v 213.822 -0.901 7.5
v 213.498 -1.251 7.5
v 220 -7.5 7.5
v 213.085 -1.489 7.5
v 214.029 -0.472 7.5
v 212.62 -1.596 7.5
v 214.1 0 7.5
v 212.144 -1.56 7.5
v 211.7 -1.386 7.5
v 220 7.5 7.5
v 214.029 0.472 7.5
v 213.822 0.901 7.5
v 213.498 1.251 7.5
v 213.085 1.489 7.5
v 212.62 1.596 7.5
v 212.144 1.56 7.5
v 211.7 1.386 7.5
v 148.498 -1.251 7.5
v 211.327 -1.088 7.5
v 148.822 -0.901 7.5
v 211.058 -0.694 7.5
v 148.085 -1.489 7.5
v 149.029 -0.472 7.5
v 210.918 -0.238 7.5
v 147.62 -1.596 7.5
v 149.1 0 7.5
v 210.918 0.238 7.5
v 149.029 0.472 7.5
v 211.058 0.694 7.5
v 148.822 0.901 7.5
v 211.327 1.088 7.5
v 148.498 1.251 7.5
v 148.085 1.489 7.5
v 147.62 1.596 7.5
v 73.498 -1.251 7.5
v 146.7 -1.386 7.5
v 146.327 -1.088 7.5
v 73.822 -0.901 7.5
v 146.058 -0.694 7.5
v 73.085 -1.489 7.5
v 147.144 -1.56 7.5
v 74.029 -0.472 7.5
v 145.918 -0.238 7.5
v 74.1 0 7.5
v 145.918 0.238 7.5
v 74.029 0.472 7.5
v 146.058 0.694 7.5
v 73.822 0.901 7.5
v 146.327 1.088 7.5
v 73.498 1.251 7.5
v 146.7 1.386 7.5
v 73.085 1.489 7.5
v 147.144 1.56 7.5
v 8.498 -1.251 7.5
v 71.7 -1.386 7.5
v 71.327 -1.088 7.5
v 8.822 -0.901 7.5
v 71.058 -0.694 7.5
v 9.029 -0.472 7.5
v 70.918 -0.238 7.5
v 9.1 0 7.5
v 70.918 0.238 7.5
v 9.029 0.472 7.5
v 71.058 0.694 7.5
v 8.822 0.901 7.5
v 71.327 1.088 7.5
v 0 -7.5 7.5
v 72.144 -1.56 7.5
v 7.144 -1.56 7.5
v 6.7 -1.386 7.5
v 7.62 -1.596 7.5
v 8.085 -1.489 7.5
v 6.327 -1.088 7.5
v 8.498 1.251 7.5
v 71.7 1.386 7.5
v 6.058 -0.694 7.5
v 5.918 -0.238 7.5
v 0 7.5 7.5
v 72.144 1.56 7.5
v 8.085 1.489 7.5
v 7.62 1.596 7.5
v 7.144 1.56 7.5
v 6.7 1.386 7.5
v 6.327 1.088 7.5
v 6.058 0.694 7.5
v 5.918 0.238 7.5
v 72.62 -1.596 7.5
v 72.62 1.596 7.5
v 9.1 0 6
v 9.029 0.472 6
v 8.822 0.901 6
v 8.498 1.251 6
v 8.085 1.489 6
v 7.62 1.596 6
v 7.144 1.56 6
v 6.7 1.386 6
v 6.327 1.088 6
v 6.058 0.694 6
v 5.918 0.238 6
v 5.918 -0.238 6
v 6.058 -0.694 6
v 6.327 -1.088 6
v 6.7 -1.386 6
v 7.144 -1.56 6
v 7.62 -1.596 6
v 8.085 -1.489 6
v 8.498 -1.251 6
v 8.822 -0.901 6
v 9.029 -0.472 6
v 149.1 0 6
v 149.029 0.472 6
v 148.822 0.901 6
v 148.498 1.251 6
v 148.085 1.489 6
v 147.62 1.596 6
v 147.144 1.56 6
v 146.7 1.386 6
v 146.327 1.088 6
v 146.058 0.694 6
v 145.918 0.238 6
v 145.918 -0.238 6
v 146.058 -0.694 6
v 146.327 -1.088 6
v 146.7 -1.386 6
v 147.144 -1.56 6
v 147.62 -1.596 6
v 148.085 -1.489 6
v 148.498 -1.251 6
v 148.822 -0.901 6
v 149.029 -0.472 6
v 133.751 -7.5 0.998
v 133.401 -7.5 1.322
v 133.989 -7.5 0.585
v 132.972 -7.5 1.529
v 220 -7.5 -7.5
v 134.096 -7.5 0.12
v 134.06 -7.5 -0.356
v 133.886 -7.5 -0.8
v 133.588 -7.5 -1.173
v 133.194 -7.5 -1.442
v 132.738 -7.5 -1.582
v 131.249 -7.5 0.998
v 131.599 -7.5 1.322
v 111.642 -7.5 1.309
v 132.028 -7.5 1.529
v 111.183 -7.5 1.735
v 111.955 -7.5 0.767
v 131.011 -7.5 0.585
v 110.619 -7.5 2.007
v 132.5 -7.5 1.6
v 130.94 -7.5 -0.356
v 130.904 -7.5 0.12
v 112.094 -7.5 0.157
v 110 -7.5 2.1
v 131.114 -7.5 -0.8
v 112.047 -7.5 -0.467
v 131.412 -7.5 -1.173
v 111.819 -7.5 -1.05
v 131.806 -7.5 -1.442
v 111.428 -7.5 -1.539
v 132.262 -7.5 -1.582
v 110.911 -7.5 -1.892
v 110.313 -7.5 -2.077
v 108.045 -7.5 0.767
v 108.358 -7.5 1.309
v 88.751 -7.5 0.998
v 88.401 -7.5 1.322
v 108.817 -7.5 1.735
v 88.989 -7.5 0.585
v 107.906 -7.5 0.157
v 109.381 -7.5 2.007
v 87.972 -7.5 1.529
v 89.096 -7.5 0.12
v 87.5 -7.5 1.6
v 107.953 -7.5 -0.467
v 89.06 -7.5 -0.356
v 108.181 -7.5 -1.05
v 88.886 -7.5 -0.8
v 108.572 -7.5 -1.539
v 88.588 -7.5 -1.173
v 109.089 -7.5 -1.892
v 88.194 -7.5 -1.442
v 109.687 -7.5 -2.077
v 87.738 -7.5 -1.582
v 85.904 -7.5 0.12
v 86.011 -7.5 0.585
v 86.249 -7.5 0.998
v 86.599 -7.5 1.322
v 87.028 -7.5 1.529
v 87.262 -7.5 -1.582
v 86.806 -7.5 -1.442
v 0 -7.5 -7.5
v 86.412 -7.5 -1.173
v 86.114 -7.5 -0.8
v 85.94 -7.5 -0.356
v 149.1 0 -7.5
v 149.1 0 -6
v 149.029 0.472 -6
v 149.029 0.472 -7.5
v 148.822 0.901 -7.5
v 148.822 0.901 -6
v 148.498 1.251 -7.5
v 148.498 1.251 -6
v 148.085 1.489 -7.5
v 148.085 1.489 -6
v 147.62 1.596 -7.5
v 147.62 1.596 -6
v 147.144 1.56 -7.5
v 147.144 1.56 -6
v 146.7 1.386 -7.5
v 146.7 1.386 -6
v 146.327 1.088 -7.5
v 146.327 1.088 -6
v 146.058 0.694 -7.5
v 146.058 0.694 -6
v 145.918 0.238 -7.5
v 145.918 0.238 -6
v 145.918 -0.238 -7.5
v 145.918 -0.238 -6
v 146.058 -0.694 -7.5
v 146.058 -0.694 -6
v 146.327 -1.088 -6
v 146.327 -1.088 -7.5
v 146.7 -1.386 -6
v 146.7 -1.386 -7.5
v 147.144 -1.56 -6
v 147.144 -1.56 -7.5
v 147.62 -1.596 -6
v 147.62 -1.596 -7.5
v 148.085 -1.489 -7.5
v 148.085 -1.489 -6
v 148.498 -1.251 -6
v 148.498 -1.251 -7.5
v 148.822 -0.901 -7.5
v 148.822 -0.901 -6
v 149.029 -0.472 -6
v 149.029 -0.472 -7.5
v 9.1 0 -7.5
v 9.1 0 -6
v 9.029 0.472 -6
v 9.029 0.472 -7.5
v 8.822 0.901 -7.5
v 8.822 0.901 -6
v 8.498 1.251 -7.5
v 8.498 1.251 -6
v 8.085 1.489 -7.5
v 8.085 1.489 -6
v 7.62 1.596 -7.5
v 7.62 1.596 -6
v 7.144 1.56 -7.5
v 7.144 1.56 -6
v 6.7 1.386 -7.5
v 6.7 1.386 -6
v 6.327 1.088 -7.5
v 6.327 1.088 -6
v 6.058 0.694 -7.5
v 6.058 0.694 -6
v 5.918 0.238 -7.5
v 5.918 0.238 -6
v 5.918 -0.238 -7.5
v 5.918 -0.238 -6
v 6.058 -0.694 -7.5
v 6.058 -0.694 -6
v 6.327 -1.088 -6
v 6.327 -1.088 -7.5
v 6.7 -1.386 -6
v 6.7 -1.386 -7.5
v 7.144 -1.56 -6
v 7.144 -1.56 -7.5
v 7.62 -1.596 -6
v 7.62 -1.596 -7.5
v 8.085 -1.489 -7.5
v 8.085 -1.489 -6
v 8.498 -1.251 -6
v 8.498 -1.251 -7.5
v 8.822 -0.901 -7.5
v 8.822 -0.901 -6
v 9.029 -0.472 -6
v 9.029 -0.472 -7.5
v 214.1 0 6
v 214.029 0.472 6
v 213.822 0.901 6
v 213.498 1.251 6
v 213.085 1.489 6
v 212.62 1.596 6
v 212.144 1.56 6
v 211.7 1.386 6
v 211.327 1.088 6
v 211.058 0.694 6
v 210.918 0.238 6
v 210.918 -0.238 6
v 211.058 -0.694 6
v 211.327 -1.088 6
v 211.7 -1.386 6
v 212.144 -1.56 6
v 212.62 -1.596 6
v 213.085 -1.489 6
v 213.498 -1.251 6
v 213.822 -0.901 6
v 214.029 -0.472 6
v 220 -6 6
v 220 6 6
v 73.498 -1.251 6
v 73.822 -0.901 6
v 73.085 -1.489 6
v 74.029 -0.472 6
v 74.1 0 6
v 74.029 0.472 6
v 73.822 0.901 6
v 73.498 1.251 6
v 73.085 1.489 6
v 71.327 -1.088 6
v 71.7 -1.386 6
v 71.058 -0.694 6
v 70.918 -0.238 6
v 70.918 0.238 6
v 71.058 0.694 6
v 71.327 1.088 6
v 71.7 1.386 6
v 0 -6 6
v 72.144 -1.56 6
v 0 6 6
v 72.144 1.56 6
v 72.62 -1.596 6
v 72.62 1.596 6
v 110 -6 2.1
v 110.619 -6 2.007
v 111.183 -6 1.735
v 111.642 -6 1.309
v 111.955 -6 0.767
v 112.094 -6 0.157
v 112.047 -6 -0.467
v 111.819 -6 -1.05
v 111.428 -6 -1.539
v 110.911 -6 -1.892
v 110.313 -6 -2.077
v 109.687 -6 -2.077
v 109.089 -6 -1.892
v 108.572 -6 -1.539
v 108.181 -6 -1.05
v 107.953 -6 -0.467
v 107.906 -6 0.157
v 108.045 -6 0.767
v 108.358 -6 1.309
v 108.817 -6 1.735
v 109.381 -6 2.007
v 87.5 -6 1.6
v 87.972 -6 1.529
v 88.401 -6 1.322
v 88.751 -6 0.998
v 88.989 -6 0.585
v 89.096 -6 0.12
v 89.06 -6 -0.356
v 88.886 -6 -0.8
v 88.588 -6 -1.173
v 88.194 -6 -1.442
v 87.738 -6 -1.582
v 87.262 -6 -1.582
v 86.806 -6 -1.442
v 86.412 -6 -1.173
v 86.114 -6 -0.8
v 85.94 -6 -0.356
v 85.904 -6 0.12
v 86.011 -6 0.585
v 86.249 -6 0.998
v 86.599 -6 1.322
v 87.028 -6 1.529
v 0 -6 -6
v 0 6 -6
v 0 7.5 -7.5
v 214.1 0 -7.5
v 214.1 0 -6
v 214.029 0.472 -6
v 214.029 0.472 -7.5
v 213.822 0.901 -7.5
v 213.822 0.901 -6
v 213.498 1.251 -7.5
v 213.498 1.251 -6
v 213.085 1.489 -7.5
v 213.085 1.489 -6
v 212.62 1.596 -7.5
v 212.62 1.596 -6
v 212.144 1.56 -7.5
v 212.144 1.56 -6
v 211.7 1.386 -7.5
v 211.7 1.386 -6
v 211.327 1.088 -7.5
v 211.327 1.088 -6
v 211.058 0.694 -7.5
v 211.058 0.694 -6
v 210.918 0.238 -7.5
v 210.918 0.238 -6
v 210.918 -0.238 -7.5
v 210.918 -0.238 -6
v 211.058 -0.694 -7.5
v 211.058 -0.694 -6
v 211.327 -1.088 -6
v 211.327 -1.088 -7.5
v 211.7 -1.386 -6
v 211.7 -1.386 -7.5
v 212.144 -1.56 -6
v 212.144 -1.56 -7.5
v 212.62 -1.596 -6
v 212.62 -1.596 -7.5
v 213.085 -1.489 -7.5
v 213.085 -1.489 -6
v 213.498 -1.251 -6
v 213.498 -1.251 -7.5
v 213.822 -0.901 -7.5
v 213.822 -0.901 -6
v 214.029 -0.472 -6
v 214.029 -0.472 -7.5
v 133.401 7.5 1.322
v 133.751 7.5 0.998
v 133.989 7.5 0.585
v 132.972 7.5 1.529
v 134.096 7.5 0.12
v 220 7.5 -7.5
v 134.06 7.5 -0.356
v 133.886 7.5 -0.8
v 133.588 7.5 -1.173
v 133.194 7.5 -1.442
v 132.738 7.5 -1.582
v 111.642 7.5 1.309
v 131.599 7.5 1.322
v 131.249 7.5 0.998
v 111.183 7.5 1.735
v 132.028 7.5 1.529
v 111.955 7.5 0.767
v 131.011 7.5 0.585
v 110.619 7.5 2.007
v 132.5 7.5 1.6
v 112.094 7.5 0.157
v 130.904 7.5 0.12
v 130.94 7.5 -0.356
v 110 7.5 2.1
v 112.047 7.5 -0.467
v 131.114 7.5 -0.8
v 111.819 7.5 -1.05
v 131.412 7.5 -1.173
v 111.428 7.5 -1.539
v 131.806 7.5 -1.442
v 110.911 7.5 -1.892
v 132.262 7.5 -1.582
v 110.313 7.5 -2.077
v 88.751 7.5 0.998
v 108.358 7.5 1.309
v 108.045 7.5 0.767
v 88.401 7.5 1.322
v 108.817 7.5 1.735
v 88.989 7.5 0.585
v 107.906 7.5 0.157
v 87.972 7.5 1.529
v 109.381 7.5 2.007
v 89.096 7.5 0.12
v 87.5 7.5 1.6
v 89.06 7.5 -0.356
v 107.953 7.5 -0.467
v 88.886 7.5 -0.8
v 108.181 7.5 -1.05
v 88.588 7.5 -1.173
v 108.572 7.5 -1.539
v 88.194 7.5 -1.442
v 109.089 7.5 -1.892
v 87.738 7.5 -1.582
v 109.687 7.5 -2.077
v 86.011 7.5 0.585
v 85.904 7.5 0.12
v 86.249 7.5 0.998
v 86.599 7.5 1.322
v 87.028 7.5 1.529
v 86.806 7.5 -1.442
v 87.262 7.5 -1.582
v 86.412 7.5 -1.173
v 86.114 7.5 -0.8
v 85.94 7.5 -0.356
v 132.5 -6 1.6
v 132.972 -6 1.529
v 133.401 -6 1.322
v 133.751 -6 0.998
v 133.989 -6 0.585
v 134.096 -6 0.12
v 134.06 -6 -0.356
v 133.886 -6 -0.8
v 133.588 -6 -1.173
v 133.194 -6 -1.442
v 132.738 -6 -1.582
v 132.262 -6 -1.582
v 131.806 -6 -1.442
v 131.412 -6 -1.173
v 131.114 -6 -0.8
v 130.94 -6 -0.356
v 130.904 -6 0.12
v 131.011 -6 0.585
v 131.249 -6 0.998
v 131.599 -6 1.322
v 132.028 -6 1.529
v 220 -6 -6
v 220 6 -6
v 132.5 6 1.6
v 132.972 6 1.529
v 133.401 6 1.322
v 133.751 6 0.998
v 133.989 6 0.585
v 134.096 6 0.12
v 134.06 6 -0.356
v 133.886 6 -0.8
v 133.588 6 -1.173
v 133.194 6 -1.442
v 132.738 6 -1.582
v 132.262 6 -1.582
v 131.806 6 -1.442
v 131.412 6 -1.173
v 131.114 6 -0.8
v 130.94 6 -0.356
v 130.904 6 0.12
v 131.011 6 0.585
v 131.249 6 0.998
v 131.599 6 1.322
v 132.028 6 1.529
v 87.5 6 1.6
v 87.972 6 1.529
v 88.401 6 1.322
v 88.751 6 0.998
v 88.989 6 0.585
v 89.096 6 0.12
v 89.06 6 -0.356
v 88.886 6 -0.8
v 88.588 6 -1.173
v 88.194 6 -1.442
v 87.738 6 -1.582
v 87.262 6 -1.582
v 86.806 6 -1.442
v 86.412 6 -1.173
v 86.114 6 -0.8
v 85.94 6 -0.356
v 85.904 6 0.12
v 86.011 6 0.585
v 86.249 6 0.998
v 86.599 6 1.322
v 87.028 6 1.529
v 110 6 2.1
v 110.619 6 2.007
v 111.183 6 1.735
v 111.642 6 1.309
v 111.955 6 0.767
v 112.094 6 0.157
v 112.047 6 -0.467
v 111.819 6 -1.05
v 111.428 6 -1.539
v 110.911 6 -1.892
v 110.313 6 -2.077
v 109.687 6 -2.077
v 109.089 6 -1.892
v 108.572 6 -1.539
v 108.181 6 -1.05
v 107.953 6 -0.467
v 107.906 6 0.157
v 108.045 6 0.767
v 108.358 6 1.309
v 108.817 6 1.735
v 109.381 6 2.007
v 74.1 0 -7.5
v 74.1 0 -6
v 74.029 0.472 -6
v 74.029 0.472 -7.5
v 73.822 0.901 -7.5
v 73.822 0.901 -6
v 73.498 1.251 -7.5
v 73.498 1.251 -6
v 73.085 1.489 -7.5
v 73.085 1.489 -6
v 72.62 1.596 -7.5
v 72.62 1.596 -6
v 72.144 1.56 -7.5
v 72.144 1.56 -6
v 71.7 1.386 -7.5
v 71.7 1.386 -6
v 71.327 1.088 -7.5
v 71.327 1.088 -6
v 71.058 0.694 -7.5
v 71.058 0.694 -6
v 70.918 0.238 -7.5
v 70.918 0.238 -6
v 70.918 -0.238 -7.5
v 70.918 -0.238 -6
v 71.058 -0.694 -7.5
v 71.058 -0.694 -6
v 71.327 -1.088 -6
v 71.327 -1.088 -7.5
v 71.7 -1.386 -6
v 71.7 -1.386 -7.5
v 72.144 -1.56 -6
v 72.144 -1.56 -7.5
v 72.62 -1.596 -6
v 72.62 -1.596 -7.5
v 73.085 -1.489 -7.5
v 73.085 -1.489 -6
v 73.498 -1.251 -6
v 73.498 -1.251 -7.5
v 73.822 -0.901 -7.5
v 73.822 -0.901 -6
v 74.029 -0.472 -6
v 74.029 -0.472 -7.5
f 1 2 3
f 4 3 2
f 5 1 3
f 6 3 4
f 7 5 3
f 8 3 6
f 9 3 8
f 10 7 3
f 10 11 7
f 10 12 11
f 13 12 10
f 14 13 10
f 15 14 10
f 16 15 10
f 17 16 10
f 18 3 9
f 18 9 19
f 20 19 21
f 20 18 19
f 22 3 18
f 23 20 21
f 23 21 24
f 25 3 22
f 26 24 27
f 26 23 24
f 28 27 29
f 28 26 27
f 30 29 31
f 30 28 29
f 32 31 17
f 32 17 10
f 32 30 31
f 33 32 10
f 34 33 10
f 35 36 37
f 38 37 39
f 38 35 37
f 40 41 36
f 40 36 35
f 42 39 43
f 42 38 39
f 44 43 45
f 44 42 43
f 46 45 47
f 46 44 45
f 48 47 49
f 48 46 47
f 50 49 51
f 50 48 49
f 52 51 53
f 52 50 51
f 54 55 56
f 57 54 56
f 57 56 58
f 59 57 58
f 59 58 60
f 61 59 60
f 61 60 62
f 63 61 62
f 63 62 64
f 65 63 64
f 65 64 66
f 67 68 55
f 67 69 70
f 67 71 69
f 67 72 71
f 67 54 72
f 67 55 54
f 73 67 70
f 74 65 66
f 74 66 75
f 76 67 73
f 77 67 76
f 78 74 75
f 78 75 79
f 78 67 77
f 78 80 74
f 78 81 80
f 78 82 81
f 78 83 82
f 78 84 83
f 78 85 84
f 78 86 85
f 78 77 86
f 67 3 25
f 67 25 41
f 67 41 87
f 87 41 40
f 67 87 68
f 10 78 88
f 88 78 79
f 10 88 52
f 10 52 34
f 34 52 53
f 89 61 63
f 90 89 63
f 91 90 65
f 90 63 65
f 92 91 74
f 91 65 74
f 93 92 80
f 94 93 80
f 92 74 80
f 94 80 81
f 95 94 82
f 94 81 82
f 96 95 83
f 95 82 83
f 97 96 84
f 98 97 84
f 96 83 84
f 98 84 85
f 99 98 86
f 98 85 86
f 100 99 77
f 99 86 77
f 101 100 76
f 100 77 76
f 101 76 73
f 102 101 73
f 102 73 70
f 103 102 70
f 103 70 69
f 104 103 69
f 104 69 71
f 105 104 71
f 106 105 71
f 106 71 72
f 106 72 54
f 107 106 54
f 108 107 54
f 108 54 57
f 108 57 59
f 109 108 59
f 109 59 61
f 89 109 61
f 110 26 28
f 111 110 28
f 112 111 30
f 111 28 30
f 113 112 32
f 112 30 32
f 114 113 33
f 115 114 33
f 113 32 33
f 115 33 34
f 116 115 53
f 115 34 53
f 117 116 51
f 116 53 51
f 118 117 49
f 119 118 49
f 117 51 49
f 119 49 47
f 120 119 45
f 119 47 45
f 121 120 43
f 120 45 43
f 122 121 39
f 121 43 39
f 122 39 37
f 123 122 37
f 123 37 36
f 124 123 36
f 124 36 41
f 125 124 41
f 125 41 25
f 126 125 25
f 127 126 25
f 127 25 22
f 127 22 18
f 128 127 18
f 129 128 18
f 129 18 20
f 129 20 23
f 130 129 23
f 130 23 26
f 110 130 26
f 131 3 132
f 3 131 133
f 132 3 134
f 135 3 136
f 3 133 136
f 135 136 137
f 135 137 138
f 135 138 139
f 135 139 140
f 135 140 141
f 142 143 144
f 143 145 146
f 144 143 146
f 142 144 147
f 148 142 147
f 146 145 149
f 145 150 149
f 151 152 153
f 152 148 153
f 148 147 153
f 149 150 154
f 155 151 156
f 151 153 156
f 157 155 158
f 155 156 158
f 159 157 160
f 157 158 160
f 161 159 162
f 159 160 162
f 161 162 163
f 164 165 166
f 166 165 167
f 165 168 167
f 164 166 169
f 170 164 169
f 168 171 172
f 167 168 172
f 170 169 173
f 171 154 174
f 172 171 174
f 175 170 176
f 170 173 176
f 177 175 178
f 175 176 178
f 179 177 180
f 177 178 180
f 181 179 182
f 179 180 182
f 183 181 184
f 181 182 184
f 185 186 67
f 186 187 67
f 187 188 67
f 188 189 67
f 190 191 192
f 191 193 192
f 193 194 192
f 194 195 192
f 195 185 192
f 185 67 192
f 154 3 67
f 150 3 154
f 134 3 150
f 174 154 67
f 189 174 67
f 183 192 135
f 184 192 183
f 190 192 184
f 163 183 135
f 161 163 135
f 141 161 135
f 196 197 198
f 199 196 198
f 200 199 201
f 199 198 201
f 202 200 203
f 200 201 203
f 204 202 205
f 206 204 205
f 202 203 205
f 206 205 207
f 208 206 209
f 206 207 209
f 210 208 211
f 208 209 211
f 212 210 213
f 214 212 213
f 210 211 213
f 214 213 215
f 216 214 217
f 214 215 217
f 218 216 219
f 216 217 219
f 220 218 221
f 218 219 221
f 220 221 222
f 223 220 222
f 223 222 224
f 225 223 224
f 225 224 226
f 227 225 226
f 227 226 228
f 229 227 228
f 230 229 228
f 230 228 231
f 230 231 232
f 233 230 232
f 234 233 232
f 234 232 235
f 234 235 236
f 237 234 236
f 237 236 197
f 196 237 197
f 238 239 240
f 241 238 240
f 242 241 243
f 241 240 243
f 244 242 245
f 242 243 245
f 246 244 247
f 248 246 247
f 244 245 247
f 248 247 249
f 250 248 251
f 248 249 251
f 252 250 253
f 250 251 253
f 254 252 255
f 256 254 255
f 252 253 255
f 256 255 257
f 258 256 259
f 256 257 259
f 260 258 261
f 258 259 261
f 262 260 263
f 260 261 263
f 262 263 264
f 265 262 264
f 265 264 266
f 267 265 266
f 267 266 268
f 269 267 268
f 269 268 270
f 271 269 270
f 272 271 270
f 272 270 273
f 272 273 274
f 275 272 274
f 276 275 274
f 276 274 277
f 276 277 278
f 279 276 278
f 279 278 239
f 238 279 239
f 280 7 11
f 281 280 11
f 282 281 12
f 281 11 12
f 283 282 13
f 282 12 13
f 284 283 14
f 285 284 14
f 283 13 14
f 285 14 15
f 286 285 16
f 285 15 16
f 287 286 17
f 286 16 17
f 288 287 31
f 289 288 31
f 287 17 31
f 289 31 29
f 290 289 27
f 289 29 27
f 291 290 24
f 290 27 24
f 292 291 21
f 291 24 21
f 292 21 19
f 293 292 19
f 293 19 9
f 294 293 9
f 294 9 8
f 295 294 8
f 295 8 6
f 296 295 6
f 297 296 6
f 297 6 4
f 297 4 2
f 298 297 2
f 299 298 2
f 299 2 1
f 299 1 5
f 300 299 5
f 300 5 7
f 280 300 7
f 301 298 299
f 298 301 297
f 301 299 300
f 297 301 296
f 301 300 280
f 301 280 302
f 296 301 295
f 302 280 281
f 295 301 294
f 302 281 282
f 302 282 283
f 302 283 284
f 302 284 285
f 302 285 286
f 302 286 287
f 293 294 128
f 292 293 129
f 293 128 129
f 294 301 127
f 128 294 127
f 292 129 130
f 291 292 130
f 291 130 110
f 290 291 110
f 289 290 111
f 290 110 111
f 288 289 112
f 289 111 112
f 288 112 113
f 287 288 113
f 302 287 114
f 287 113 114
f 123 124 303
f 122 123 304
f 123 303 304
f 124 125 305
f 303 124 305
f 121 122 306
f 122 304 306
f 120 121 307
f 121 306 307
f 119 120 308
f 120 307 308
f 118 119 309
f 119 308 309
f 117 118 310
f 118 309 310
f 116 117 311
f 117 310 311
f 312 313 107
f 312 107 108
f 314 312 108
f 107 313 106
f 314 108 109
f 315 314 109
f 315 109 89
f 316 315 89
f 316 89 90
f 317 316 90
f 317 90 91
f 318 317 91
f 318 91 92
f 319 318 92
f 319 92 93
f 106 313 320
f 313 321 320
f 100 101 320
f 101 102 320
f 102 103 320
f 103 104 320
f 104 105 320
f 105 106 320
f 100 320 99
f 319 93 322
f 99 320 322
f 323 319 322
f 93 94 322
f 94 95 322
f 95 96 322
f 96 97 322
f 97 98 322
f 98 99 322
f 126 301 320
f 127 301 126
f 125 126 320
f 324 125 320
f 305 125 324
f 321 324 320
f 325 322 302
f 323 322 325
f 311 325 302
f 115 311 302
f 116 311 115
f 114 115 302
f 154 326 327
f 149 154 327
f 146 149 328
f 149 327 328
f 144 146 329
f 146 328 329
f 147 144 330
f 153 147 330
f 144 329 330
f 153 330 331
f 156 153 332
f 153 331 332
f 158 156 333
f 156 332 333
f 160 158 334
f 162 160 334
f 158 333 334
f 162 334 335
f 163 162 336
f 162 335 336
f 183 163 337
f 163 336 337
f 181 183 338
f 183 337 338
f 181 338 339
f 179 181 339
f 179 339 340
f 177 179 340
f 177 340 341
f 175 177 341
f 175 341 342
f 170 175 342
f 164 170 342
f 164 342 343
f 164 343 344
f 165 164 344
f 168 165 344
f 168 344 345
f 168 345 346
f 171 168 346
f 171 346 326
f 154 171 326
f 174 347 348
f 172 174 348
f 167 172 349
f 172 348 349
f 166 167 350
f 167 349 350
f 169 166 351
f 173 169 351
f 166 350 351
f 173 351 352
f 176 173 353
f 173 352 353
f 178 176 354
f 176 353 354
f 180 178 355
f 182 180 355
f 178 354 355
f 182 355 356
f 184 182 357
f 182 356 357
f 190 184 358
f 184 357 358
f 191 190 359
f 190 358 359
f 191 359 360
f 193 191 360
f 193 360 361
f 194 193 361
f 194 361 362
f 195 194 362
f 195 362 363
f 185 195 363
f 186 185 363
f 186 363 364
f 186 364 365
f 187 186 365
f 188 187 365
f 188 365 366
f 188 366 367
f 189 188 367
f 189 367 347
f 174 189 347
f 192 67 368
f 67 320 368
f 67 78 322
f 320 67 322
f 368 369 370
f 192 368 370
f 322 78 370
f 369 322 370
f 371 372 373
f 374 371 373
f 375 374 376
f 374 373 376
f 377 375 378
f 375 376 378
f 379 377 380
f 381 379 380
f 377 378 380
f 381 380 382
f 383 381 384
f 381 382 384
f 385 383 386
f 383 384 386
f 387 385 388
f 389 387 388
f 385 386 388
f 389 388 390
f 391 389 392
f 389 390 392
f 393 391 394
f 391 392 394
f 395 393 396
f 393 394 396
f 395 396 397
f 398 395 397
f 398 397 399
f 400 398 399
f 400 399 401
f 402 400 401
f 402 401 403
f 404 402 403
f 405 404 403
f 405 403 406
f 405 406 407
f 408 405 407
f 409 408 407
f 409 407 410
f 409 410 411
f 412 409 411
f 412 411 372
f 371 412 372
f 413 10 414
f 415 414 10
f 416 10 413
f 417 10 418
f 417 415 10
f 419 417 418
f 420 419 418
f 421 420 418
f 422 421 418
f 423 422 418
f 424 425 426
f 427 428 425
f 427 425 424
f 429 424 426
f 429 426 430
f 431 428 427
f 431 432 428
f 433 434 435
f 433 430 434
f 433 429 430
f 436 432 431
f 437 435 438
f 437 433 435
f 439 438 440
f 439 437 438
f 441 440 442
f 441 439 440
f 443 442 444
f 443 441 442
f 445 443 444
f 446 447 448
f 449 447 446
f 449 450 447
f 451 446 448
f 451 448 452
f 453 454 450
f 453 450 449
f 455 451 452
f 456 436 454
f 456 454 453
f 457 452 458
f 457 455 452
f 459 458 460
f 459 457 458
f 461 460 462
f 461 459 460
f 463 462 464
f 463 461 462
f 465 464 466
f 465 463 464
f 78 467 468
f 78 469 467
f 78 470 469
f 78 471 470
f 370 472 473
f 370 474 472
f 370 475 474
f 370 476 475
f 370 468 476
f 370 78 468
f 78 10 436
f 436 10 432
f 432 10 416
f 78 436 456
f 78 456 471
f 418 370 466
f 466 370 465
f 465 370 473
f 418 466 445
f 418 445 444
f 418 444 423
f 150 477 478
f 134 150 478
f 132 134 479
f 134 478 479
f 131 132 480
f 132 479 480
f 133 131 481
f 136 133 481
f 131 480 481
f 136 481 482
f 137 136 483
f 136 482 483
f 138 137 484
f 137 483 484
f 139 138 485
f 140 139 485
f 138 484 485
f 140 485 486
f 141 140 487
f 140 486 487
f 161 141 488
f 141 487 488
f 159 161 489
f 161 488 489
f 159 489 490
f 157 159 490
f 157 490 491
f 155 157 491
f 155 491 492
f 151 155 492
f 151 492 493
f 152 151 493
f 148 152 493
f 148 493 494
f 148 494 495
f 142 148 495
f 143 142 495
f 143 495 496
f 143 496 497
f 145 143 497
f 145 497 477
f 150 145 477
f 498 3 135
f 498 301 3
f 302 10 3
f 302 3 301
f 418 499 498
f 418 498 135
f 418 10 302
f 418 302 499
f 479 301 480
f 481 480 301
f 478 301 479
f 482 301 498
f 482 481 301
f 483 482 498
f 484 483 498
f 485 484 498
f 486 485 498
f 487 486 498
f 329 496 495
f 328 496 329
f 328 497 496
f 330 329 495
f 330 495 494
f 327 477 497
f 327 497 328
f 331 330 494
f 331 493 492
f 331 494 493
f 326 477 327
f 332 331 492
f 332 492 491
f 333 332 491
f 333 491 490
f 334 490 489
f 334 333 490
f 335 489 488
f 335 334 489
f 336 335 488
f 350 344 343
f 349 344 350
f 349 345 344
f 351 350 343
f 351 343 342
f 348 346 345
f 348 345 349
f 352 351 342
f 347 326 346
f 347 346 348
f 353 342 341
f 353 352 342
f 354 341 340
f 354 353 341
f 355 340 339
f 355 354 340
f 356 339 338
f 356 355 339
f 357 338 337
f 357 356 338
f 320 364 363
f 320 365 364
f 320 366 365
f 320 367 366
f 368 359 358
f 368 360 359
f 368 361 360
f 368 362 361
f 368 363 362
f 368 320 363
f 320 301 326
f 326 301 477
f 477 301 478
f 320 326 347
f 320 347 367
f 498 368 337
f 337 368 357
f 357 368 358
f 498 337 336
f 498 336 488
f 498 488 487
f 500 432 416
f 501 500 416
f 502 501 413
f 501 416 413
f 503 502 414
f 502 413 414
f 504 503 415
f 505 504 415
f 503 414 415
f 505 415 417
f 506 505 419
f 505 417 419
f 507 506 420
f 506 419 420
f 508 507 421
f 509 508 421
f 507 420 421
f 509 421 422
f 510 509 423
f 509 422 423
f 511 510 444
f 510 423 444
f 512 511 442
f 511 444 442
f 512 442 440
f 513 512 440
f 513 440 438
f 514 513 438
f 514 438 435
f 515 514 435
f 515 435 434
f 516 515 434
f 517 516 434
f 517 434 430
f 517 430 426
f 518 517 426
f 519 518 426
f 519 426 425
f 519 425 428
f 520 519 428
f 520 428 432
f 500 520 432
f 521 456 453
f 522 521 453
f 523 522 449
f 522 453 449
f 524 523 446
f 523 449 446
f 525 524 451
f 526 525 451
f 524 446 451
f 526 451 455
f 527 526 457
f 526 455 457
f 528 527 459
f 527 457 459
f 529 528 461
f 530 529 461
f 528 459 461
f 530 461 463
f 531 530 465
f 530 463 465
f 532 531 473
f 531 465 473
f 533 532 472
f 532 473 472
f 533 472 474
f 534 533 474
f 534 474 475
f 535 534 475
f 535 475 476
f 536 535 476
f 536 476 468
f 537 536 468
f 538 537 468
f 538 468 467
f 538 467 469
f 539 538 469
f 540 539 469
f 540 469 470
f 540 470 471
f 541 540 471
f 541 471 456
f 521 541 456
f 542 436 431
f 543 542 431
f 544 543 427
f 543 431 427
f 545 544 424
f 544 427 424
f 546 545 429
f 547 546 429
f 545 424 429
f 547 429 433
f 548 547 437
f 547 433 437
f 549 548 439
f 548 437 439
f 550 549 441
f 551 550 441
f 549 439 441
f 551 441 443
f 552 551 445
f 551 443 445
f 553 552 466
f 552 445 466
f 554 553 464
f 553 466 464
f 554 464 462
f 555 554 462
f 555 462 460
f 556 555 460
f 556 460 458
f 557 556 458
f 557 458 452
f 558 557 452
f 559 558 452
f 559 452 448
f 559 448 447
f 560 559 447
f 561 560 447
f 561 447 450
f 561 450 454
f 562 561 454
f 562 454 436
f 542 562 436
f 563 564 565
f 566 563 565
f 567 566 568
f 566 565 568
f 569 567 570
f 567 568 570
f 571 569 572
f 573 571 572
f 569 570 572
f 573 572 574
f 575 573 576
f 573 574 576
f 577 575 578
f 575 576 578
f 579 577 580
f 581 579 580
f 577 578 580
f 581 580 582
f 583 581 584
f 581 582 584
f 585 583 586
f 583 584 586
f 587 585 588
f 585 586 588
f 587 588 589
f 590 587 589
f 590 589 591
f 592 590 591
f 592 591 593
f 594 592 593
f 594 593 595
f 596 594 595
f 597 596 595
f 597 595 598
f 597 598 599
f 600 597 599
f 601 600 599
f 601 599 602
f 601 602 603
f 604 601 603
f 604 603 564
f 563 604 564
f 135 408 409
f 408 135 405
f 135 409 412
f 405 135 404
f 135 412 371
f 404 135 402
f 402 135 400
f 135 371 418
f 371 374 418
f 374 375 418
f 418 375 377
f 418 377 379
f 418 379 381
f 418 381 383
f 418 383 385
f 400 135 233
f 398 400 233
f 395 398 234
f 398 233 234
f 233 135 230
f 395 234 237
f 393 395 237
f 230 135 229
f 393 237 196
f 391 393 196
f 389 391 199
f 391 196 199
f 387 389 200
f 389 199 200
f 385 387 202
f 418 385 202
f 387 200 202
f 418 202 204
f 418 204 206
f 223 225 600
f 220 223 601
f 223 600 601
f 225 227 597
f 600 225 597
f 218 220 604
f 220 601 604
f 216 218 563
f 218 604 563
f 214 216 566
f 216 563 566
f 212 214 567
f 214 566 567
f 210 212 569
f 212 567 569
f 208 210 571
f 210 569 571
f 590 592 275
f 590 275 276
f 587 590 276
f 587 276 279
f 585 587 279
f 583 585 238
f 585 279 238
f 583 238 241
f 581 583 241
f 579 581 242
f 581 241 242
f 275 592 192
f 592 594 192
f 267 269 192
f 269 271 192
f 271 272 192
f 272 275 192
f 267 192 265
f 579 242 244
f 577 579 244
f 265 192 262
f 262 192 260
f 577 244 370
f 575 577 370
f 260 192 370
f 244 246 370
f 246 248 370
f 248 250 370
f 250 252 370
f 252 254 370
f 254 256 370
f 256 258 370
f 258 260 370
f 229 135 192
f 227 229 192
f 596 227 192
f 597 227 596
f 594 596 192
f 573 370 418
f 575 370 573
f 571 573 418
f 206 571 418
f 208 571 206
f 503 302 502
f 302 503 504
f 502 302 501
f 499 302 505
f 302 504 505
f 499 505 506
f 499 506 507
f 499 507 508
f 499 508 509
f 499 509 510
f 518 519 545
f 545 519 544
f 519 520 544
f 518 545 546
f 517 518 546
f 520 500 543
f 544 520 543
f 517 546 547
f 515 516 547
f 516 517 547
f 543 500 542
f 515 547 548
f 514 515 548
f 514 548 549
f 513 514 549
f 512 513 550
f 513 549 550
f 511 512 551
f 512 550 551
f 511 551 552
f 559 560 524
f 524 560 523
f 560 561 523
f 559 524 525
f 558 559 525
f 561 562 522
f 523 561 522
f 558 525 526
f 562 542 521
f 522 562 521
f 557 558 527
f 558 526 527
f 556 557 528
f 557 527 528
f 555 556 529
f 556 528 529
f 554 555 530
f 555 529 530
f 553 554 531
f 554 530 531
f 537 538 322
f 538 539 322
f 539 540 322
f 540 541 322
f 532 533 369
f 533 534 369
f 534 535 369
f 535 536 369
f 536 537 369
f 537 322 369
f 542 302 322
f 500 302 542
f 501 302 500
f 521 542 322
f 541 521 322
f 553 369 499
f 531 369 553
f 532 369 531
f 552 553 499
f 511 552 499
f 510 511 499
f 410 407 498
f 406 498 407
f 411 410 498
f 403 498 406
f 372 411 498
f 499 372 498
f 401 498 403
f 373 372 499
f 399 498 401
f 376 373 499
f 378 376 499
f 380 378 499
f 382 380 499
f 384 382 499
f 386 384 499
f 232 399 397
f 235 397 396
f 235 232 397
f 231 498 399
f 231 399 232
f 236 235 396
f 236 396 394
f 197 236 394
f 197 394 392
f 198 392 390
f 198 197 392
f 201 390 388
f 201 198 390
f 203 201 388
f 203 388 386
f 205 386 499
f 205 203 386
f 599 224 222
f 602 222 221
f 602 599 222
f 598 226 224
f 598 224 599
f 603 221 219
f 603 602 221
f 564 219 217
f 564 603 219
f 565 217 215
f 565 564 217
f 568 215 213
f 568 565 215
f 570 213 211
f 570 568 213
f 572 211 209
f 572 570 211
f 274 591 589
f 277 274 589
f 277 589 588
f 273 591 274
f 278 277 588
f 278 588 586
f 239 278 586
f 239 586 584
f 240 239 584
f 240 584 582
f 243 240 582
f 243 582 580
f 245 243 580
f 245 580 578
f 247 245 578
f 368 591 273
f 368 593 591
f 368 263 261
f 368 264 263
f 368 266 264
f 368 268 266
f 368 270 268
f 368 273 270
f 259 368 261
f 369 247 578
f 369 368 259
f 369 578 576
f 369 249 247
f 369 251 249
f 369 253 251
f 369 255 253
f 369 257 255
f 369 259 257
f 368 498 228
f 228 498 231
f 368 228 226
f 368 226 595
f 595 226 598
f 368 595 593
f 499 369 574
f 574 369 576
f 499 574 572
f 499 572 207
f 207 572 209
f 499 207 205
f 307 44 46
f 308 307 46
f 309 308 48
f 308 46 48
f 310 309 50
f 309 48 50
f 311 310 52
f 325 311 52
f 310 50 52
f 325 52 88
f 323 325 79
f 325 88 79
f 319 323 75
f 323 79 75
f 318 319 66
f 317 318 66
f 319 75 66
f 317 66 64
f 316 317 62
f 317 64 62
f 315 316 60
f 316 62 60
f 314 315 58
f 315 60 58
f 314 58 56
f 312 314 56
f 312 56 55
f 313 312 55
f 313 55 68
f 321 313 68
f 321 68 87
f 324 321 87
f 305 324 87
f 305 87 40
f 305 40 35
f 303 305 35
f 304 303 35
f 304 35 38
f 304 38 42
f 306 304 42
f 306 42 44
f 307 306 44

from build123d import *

# Parameters (mm, degrees)
SKETCH_1_W          = 15
SKETCH_1_H          = 15
SKETCH_1_W_2        = 12
SKETCH_1_H_2        = 12
EXTRUDE_1_DEPTH     = 220
SKETCH_3_R          = 1.6
CUT_EXTRUDE_2_DEPTH = 221.638278637
SKETCH_4_R          = 2.1
SKETCH_4_R_2        = 1.6
CUT_EXTRUDE_3_DEPTH = 221.638278637


with BuildPart() as part:
    # ｽｹｯﾁ1 → ﾎﾞｽ - 押し出し1 (new body)
    with BuildSketch(Plane(origin=(0, 0, 0), x_dir=(0, 0, -1), z_dir=(1, 0, 0))):
        Rectangle(SKETCH_1_W, SKETCH_1_H)
        Rectangle(SKETCH_1_W_2, SKETCH_1_H_2, mode=Mode.SUBTRACT)
    extrude(amount=EXTRUDE_1_DEPTH)

    # ｽｹｯﾁ3 → ｶｯﾄ - 押し出し2 (cut, through all)
    with BuildSketch(Plane.XY.offset(7.5)):
        with Locations((7.5, 0)):
            Circle(SKETCH_3_R)
        with Locations((212.5, 0)):
            Circle(SKETCH_3_R)
        with Locations((72.5, 0)):
            Circle(SKETCH_3_R)
        with Locations((147.5, 0)):
            Circle(SKETCH_3_R)
    extrude(amount=-CUT_EXTRUDE_2_DEPTH, mode=Mode.SUBTRACT)

    # ｽｹｯﾁ4 → ｶｯﾄ - 押し出し3 (cut, through all)
    with BuildSketch(Plane(origin=(0, 7.5, 0), x_dir=(1, 0, 0), z_dir=(0, 1, 0))):
        with Locations(Location((110, 0, 0), (0, 0, 270))):
            Circle(SKETCH_4_R)
        with Locations(Location((132.5, 0, 0), (0, 0, 270))):
            Circle(SKETCH_4_R_2)
        with Locations(Location((87.5, 0, 0), (0, 0, 270))):
            Circle(SKETCH_4_R_2)
    extrude(amount=-CUT_EXTRUDE_3_DEPTH, mode=Mode.SUBTRACT)


solid = part.part
